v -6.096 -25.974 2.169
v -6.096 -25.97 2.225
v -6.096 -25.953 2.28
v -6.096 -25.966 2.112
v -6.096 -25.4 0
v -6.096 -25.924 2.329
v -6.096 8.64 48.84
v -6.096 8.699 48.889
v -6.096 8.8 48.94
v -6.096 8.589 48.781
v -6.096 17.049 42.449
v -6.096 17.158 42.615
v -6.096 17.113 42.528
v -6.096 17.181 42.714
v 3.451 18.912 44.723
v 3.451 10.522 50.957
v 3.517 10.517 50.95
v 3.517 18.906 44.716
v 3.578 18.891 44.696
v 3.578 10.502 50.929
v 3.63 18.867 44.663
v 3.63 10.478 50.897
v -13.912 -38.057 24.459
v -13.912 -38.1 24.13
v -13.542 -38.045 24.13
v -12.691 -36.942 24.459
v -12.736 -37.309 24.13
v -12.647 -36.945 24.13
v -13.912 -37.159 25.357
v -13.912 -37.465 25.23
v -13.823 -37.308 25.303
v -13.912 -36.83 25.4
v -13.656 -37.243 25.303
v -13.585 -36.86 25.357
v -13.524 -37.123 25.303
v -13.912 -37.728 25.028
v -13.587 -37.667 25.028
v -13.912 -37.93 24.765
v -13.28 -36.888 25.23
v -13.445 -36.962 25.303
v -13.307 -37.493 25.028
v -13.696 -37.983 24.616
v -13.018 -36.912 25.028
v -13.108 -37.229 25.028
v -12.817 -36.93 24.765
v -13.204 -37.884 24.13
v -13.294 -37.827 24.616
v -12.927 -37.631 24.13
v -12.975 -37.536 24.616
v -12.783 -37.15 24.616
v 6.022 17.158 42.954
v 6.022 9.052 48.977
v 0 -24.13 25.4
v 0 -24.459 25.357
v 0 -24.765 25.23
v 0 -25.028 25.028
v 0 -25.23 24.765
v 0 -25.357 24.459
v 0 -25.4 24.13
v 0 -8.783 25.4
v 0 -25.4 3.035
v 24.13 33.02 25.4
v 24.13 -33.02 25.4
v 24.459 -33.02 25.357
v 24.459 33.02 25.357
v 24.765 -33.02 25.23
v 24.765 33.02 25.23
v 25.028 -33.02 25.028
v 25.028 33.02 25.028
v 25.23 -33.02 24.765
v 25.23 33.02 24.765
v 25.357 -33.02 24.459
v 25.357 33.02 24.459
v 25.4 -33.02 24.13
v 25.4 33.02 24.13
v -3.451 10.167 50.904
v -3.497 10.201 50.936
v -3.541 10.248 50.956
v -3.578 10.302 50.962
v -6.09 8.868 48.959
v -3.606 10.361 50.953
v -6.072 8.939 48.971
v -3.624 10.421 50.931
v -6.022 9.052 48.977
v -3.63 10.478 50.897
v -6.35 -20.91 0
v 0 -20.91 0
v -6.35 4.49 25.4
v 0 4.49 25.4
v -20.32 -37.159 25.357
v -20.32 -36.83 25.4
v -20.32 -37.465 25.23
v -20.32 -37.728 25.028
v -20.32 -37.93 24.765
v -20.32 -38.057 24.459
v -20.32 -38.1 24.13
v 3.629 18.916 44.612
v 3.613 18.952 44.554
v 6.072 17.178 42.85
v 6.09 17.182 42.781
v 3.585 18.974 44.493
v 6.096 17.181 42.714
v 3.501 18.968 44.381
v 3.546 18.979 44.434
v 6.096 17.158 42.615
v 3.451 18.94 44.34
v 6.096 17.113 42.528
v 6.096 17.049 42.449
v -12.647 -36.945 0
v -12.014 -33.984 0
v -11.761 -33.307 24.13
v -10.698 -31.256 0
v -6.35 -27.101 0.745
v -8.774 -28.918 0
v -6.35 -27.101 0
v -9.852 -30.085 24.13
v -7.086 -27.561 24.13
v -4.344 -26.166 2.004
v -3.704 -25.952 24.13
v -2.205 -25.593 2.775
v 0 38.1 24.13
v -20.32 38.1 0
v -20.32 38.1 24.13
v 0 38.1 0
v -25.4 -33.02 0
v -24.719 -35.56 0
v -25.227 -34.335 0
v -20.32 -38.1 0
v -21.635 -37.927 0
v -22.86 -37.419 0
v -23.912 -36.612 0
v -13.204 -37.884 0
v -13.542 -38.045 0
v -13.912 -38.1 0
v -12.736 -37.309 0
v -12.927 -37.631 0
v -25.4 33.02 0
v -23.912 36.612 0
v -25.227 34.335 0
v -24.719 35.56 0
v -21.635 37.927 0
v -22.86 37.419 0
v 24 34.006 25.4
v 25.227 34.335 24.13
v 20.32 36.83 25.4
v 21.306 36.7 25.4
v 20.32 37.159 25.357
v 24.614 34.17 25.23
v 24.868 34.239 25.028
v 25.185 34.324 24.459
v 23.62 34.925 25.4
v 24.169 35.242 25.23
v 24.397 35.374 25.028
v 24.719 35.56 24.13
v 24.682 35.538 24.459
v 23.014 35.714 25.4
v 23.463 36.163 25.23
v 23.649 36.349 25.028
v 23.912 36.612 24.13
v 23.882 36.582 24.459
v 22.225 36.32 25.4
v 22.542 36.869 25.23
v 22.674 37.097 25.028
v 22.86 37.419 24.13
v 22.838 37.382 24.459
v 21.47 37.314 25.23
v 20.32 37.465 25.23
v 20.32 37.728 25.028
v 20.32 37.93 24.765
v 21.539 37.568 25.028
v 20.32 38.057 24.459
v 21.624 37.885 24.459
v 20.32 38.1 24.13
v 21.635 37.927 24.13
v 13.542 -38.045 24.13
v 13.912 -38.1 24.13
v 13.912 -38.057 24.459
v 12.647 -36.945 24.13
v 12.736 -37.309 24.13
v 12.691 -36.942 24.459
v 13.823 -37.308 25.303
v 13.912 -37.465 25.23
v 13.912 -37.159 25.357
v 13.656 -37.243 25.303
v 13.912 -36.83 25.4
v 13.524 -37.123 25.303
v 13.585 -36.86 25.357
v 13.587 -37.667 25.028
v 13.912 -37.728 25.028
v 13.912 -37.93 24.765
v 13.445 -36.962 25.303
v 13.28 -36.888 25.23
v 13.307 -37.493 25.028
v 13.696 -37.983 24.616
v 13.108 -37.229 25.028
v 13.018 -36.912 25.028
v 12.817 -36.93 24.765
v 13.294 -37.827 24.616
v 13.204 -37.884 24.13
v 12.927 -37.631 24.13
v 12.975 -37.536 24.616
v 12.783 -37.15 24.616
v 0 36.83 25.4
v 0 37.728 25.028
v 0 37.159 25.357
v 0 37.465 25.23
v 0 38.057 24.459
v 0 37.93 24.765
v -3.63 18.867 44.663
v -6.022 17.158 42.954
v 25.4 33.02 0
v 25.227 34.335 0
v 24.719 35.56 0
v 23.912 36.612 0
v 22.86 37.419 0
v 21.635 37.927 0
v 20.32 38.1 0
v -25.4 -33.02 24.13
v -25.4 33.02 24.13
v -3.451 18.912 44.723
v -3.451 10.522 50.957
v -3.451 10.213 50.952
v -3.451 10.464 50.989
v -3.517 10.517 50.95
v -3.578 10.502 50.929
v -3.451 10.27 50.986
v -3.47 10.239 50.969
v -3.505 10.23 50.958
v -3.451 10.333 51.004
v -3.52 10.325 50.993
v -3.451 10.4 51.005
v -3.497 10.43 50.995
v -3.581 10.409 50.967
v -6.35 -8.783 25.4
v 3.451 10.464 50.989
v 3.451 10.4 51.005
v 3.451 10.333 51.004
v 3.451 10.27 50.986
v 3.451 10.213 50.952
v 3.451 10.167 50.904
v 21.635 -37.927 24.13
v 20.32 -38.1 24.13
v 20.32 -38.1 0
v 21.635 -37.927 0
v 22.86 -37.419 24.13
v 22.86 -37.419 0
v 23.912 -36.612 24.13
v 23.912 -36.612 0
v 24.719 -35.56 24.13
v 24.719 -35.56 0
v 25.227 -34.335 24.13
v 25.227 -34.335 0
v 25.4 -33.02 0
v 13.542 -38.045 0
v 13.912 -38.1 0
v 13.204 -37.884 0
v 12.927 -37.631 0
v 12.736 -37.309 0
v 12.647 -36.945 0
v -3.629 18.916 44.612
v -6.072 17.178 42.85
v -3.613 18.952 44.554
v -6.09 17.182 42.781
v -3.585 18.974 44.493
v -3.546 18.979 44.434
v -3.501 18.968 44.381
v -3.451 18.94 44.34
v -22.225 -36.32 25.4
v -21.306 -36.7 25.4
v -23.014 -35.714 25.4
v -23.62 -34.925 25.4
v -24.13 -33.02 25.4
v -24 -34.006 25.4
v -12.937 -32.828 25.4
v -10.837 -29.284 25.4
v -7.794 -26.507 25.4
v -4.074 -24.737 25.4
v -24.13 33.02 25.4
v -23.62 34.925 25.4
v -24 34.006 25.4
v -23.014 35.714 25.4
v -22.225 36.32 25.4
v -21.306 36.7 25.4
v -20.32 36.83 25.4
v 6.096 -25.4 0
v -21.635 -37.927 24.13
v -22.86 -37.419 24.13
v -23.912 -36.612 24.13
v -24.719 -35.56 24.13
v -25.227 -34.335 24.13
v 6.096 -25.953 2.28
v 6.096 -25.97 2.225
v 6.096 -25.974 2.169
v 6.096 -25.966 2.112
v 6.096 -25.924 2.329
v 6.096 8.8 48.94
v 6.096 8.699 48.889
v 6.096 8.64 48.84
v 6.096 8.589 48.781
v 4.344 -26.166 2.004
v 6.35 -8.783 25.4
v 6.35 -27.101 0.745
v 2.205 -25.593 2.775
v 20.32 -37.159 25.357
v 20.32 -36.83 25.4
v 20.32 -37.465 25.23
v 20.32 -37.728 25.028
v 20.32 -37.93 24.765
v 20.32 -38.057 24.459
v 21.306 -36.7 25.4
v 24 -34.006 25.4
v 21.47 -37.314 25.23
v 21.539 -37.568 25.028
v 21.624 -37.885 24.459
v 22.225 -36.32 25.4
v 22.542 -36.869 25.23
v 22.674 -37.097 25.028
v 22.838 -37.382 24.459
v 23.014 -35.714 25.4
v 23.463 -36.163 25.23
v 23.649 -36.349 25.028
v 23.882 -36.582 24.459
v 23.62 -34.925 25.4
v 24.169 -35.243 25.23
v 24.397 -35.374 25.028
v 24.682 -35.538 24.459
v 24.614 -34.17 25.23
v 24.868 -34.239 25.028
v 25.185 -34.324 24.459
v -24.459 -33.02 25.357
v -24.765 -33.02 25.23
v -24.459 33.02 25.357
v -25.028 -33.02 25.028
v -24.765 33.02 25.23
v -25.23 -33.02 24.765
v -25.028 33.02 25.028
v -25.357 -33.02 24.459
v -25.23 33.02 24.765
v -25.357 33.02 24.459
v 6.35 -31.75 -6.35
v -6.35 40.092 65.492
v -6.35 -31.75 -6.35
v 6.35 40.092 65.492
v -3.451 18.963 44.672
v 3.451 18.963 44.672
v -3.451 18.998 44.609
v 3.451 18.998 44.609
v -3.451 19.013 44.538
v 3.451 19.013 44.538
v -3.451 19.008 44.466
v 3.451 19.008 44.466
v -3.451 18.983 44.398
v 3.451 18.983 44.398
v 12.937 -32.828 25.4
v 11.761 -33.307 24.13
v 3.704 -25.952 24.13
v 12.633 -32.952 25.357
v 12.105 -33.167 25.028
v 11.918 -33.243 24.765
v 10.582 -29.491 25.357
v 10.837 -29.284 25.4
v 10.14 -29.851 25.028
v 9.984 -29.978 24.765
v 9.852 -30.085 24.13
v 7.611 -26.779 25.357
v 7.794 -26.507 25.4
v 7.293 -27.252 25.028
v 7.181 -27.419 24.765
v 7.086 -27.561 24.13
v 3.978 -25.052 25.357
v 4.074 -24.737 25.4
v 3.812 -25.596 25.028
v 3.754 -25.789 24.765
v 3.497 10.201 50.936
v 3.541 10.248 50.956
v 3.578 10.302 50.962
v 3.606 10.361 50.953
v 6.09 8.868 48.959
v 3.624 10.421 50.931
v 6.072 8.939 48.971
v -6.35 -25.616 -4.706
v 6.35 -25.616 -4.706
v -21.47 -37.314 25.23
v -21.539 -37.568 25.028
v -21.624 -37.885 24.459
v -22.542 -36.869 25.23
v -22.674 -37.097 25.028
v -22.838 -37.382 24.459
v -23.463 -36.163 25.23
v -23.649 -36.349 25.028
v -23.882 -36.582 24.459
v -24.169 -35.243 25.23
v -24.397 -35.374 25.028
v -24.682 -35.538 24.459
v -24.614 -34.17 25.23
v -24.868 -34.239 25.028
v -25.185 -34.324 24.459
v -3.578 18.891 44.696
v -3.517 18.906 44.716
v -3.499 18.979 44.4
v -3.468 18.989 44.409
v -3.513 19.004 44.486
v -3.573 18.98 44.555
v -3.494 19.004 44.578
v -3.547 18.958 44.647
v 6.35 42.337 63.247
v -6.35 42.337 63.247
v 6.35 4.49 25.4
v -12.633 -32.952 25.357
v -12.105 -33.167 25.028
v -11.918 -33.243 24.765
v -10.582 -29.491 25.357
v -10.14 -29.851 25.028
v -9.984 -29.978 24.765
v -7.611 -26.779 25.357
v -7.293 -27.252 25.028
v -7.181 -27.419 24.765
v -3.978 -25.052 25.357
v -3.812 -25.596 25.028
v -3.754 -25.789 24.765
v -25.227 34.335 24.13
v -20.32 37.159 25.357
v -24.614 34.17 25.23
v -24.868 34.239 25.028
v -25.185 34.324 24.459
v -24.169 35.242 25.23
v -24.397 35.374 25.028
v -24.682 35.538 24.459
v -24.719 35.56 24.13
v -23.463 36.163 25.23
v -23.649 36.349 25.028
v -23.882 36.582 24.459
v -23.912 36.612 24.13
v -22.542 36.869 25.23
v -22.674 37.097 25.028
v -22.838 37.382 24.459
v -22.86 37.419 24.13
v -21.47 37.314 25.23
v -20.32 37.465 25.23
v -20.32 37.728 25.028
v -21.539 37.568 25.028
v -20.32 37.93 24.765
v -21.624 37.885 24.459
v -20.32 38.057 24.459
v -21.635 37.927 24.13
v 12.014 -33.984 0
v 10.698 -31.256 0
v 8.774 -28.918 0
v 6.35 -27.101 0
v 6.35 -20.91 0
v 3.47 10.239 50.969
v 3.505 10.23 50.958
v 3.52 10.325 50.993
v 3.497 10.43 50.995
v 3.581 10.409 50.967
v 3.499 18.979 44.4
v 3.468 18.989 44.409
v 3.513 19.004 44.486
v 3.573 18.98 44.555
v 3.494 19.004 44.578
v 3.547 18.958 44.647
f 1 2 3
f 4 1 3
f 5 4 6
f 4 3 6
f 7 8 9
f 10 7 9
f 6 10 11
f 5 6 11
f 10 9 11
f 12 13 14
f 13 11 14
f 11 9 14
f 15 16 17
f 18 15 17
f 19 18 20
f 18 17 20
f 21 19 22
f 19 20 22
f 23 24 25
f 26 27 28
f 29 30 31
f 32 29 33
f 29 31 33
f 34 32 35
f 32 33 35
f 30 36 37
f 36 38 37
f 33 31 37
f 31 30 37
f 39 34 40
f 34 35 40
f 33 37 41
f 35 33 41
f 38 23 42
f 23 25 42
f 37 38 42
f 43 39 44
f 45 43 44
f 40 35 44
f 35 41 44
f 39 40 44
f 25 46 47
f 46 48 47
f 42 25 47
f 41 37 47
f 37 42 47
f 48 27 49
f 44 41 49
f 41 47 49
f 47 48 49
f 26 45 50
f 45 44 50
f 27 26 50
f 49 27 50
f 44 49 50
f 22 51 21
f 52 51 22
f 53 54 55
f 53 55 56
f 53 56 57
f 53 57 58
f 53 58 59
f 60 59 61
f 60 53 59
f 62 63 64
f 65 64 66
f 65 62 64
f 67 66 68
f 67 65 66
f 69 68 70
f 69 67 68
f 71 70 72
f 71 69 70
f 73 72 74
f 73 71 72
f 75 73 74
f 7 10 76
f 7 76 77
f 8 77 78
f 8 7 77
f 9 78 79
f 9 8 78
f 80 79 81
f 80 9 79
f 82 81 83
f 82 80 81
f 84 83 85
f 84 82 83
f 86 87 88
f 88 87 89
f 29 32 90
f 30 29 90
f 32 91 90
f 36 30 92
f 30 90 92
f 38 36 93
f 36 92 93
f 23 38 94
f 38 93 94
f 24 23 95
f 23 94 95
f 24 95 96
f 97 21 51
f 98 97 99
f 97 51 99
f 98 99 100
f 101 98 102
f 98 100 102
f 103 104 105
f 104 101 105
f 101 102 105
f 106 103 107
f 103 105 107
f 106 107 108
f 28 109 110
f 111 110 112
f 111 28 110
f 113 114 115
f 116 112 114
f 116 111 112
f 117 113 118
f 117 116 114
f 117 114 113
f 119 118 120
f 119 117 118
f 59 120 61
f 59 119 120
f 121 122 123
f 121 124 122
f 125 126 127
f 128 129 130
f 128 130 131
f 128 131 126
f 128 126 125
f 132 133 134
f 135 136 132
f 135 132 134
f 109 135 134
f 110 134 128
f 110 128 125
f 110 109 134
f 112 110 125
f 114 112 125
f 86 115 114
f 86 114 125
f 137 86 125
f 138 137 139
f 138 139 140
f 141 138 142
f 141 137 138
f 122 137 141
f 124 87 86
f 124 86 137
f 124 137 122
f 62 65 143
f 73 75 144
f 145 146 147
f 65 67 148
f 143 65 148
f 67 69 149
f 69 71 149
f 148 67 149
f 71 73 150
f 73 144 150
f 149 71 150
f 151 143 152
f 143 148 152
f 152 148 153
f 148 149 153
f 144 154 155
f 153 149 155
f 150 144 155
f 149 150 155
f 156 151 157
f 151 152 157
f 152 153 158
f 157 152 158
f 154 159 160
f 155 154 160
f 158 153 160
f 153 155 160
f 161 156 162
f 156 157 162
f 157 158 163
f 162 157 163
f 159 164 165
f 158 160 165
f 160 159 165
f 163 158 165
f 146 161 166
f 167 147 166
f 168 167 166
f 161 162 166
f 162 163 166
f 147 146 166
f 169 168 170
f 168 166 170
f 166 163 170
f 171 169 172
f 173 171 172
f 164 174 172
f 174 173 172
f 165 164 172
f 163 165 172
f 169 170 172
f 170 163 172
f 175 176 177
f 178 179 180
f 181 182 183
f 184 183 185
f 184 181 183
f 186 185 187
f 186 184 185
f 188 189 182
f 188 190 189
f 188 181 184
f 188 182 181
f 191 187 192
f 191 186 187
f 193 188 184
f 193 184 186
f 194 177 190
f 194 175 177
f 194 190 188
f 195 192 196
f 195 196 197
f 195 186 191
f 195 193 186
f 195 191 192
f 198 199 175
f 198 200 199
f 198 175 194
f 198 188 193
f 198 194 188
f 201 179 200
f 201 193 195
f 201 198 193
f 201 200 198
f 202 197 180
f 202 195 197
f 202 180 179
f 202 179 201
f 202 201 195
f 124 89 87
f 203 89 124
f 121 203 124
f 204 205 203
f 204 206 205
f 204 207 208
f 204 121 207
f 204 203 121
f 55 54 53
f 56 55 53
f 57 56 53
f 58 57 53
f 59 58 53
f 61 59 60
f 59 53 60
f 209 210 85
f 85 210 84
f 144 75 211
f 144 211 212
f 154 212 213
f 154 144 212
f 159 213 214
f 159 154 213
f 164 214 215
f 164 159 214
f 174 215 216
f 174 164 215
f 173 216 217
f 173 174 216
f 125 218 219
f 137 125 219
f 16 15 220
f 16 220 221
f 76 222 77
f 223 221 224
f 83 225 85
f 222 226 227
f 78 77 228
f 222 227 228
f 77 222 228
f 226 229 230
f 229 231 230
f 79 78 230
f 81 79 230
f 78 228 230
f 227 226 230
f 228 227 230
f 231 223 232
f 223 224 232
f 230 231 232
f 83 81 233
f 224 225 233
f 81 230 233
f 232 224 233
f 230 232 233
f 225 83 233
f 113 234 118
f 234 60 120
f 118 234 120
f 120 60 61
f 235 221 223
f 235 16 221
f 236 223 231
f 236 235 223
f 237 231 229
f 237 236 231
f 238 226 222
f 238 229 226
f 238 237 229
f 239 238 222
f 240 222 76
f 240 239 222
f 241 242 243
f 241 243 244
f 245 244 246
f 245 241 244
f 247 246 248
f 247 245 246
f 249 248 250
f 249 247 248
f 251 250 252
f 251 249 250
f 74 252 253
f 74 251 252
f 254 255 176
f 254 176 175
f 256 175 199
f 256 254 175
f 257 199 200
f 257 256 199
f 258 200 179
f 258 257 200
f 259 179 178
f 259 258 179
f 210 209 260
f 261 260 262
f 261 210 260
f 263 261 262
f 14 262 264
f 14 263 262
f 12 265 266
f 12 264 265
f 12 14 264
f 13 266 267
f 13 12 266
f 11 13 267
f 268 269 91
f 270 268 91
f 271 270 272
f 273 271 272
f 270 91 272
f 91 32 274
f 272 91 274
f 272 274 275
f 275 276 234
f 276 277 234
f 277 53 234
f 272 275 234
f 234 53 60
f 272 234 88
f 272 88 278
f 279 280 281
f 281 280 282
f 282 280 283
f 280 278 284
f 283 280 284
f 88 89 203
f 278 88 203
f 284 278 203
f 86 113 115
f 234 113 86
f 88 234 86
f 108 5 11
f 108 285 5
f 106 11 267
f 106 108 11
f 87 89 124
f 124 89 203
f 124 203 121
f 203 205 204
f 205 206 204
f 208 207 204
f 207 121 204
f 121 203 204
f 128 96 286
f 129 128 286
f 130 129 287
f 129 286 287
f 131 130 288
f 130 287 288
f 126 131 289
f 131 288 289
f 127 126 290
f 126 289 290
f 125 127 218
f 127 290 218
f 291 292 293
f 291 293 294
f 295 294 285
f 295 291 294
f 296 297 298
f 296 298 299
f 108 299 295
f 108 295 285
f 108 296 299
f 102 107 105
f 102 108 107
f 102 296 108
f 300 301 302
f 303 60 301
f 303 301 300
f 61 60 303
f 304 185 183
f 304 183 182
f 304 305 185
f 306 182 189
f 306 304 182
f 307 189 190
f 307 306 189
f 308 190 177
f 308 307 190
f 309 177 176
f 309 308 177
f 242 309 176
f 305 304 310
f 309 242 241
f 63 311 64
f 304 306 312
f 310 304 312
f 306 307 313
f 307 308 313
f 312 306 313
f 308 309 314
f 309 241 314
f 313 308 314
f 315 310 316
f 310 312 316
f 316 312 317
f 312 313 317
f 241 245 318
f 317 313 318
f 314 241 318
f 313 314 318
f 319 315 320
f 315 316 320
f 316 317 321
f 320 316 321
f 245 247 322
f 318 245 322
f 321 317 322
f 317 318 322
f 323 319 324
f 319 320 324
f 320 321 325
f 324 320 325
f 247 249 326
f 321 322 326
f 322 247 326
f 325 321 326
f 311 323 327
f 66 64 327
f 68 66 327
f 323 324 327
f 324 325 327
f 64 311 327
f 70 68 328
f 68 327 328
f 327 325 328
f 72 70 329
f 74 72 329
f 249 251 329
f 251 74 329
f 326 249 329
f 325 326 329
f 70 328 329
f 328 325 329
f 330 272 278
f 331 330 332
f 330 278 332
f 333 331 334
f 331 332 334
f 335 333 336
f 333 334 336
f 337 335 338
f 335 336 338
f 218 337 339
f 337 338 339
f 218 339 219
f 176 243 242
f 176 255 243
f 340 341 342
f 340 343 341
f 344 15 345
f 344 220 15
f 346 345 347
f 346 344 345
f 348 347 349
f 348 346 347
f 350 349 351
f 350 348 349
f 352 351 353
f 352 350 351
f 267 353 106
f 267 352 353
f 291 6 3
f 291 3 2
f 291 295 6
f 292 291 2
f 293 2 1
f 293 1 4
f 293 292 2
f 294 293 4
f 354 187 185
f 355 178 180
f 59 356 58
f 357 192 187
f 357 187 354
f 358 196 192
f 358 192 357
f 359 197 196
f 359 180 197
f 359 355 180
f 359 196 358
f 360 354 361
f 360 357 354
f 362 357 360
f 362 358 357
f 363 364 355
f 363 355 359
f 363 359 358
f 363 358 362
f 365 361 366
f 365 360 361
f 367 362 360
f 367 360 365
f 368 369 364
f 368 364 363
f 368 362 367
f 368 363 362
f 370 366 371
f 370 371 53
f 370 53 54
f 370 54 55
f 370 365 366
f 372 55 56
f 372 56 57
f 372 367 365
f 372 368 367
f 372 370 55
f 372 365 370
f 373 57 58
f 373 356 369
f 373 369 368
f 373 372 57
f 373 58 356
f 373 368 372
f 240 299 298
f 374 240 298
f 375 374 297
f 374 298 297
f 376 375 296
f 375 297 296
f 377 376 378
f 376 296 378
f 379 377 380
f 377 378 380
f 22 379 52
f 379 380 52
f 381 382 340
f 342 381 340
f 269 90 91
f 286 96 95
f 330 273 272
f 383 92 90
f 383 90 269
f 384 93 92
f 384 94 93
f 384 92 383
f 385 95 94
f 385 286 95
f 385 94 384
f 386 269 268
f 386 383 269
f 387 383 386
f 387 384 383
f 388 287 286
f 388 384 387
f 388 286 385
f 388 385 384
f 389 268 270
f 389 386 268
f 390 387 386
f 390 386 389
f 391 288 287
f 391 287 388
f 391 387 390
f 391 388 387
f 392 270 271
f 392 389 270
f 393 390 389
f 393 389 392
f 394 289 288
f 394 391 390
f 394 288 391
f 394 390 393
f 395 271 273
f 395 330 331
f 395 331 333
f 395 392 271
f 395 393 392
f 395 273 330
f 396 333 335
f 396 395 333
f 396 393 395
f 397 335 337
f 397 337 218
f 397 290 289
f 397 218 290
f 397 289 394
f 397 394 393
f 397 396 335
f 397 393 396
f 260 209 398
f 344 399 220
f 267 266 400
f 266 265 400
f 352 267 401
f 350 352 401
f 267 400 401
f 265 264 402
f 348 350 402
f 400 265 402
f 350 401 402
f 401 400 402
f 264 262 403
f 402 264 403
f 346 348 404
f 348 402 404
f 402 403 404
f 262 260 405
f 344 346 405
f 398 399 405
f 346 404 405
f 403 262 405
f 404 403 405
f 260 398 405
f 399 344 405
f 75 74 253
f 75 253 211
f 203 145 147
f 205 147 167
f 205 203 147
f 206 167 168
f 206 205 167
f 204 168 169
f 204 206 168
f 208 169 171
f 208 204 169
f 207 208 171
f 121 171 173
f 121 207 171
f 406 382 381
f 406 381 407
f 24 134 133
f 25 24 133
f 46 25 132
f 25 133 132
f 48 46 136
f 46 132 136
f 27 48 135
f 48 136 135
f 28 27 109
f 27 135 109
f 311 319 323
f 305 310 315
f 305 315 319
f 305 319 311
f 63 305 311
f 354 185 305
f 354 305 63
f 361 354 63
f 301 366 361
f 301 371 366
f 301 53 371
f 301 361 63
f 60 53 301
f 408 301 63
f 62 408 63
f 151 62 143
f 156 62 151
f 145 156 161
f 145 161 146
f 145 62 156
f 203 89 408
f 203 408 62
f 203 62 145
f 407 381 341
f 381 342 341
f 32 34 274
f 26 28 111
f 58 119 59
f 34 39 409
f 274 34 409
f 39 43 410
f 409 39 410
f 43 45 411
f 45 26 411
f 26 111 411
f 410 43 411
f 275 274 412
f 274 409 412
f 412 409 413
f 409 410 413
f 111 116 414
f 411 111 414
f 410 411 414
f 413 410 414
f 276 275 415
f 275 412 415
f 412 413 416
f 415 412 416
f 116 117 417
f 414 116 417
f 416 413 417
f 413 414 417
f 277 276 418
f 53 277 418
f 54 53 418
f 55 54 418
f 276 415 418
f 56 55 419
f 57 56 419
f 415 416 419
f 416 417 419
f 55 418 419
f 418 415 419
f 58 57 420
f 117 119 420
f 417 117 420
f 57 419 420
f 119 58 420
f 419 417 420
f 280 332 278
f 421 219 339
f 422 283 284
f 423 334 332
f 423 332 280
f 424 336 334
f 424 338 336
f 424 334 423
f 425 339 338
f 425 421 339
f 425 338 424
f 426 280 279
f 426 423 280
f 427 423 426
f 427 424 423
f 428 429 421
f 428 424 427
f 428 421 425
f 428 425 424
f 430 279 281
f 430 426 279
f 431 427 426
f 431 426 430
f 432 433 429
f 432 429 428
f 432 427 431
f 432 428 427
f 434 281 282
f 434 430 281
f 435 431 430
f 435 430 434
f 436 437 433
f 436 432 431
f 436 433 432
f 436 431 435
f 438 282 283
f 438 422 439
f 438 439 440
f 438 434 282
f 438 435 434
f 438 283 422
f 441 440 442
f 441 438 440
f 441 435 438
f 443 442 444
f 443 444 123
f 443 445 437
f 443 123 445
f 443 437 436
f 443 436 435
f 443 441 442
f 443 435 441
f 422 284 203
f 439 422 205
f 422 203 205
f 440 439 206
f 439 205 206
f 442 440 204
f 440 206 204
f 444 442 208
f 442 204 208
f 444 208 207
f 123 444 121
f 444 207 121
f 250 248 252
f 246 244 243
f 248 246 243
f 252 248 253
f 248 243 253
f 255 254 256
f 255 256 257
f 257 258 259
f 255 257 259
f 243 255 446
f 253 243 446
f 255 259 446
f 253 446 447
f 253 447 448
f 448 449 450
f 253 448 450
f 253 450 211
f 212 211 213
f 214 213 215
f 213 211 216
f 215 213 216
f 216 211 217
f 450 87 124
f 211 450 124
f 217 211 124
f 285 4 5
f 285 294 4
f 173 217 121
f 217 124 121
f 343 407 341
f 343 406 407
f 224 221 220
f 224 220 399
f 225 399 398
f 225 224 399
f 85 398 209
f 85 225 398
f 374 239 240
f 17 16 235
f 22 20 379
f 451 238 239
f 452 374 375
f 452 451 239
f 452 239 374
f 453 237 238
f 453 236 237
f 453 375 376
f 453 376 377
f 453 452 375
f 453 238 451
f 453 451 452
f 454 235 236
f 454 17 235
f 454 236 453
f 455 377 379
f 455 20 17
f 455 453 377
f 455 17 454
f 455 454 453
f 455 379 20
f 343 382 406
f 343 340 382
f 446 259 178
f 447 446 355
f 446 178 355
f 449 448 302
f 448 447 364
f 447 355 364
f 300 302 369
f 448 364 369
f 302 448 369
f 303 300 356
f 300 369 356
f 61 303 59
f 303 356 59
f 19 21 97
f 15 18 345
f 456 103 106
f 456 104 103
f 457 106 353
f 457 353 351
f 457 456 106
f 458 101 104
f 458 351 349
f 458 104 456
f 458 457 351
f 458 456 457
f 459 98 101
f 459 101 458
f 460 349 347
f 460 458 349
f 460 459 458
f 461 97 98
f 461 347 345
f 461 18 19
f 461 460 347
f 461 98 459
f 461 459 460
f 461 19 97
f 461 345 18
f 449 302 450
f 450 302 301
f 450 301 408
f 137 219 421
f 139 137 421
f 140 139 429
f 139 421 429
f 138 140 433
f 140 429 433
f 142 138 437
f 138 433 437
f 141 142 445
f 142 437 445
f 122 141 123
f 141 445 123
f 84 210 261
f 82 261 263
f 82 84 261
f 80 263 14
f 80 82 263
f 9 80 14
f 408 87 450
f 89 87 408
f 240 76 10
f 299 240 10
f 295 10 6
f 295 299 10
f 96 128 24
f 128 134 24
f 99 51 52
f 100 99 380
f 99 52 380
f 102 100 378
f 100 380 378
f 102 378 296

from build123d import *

# Parameters (mm, degrees)
F0_W      = 76.2
F0_H      = 25.4
F1_DEPTH  = 25.4
F4_DEPTH  = 6.35
F6_DEPTH  = 25.401
F7_R      = 5.08
F8_R      = 1.27
F11_DEPTH = 6.096
F13_SIZE  = 2.54
F14_R     = 0.254
F15_DEPTH = 6.35
F17_DEPTH = 31.751


with BuildPart() as f1:
    # F0 (on Right) → F1 (new body)
    with BuildSketch(Plane.YZ):
        with Locations((0, 12.7)):
            Rectangle(F0_W, F0_H)
    extrude(amount=F1_DEPTH)

    # F3 (on Right) → F4 (cut)
    with BuildSketch(Plane.YZ):
        Polygon((-27.6551328865, 0), (-20.9098719395, 0), (4.4901280605, 25.4), (-8.7829526009, 25.4), align=None)
    extrude(amount=F4_DEPTH, mode=Mode.SUBTRACT)

    # F5 (on face) → F6 (cut, through all)
    with BuildSketch(Plane.XY.offset(25.4)):
        with BuildLine():
            Line((0, -38.1), (12.7, -38.1))
            ThreePointArc((12.7, -38.1), (8.9802561211, -29.1197438789), (0, -25.4))
            Line((0, -25.4), (0, -38.1))
        make_face()
    extrude(amount=-F6_DEPTH, mode=Mode.SUBTRACT)

    # F7
    f7_edges = [f1.edges().sort_by_distance(p)[0] for p in [
        (25.4, -38.1, 12.7),
        (25.4, 38.1, 12.7),
    ]]
    fillet(f7_edges, radius=F7_R)

    # F8
    f8_edges = [f1.edges().sort_by_distance(p)[0] for p in [
        (25.4, 0, 25.4),
        (8.980256, -29.119744, 25.4),
        (12.7, -38.1, 12.7),
    ]]
    fillet(f8_edges, radius=F8_R)


with BuildPart() as f9_1:
    # F9: instance of F1
    add(f1.part.mirror(Plane.YZ))


with BuildPart() as f11:
    # F10 (on Right) → F11 (new body, symmetric)
    with BuildSketch(Plane.YZ):
        Polygon((19.1477272148, 44.5477272148), (10.3181454552, 51.108099609), (-25.9977169814, 2.2307101433), (-25.4, 0), align=None)
    extrude(amount=F11_DEPTH, both=True)

    # F13
    f13_edges = [f11.edges().sort_by_distance(p)[0] for p in [
        (-6.096, 14.732936, 47.827913),
        (6.096, 14.732936, 47.827913),
    ]]
    chamfer(f13_edges, length=F13_SIZE)

    # F14
    f14_edges = [f11.edges().sort_by_distance(p)[0] for p in [
        (0, -25.997717, 2.23071),
        (3.556, 14.732936, 47.827913),
        (6.096, 13.067777, 45.900763),
        (-3.556, 14.732936, 47.827913),
        (-6.096, 13.067777, 45.900763),
        (0, 10.318145, 51.1081),
        (-4.826, 9.560721, 50.088684),
        (4.826, 9.560721, 50.088684),
        (-4.826, 18.239992, 43.639992),
        (4.826, 18.239992, 43.639992),
        (0, 19.147727, 44.547727),
    ]]
    fillet(f14_edges, radius=F14_R)


with BuildPart() as f15:
    # F12 (on Right) → F15 (new body, symmetric)
    with BuildSketch(Plane.YZ):
        Polygon((40.0920489686, 65.4920489686), (-31.75, -6.35), (-29.5049359697, -8.5950640303), (42.3371129988, 63.2469849383), align=None)
    extrude(amount=F15_DEPTH, both=True)

    # F16 (on face) → F17 (cut, through all)
    with BuildSketch(Plane.YZ.offset(6.35)):
        Polygon((-25.6163710031, -4.7064990636), (-31.75, -6.35), (-29.5049359697, -8.5950640303), align=None)
    extrude(amount=-F17_DEPTH, mode=Mode.SUBTRACT)


solid = Compound([f1.part, f9_1.part, f11.part, f15.part])
